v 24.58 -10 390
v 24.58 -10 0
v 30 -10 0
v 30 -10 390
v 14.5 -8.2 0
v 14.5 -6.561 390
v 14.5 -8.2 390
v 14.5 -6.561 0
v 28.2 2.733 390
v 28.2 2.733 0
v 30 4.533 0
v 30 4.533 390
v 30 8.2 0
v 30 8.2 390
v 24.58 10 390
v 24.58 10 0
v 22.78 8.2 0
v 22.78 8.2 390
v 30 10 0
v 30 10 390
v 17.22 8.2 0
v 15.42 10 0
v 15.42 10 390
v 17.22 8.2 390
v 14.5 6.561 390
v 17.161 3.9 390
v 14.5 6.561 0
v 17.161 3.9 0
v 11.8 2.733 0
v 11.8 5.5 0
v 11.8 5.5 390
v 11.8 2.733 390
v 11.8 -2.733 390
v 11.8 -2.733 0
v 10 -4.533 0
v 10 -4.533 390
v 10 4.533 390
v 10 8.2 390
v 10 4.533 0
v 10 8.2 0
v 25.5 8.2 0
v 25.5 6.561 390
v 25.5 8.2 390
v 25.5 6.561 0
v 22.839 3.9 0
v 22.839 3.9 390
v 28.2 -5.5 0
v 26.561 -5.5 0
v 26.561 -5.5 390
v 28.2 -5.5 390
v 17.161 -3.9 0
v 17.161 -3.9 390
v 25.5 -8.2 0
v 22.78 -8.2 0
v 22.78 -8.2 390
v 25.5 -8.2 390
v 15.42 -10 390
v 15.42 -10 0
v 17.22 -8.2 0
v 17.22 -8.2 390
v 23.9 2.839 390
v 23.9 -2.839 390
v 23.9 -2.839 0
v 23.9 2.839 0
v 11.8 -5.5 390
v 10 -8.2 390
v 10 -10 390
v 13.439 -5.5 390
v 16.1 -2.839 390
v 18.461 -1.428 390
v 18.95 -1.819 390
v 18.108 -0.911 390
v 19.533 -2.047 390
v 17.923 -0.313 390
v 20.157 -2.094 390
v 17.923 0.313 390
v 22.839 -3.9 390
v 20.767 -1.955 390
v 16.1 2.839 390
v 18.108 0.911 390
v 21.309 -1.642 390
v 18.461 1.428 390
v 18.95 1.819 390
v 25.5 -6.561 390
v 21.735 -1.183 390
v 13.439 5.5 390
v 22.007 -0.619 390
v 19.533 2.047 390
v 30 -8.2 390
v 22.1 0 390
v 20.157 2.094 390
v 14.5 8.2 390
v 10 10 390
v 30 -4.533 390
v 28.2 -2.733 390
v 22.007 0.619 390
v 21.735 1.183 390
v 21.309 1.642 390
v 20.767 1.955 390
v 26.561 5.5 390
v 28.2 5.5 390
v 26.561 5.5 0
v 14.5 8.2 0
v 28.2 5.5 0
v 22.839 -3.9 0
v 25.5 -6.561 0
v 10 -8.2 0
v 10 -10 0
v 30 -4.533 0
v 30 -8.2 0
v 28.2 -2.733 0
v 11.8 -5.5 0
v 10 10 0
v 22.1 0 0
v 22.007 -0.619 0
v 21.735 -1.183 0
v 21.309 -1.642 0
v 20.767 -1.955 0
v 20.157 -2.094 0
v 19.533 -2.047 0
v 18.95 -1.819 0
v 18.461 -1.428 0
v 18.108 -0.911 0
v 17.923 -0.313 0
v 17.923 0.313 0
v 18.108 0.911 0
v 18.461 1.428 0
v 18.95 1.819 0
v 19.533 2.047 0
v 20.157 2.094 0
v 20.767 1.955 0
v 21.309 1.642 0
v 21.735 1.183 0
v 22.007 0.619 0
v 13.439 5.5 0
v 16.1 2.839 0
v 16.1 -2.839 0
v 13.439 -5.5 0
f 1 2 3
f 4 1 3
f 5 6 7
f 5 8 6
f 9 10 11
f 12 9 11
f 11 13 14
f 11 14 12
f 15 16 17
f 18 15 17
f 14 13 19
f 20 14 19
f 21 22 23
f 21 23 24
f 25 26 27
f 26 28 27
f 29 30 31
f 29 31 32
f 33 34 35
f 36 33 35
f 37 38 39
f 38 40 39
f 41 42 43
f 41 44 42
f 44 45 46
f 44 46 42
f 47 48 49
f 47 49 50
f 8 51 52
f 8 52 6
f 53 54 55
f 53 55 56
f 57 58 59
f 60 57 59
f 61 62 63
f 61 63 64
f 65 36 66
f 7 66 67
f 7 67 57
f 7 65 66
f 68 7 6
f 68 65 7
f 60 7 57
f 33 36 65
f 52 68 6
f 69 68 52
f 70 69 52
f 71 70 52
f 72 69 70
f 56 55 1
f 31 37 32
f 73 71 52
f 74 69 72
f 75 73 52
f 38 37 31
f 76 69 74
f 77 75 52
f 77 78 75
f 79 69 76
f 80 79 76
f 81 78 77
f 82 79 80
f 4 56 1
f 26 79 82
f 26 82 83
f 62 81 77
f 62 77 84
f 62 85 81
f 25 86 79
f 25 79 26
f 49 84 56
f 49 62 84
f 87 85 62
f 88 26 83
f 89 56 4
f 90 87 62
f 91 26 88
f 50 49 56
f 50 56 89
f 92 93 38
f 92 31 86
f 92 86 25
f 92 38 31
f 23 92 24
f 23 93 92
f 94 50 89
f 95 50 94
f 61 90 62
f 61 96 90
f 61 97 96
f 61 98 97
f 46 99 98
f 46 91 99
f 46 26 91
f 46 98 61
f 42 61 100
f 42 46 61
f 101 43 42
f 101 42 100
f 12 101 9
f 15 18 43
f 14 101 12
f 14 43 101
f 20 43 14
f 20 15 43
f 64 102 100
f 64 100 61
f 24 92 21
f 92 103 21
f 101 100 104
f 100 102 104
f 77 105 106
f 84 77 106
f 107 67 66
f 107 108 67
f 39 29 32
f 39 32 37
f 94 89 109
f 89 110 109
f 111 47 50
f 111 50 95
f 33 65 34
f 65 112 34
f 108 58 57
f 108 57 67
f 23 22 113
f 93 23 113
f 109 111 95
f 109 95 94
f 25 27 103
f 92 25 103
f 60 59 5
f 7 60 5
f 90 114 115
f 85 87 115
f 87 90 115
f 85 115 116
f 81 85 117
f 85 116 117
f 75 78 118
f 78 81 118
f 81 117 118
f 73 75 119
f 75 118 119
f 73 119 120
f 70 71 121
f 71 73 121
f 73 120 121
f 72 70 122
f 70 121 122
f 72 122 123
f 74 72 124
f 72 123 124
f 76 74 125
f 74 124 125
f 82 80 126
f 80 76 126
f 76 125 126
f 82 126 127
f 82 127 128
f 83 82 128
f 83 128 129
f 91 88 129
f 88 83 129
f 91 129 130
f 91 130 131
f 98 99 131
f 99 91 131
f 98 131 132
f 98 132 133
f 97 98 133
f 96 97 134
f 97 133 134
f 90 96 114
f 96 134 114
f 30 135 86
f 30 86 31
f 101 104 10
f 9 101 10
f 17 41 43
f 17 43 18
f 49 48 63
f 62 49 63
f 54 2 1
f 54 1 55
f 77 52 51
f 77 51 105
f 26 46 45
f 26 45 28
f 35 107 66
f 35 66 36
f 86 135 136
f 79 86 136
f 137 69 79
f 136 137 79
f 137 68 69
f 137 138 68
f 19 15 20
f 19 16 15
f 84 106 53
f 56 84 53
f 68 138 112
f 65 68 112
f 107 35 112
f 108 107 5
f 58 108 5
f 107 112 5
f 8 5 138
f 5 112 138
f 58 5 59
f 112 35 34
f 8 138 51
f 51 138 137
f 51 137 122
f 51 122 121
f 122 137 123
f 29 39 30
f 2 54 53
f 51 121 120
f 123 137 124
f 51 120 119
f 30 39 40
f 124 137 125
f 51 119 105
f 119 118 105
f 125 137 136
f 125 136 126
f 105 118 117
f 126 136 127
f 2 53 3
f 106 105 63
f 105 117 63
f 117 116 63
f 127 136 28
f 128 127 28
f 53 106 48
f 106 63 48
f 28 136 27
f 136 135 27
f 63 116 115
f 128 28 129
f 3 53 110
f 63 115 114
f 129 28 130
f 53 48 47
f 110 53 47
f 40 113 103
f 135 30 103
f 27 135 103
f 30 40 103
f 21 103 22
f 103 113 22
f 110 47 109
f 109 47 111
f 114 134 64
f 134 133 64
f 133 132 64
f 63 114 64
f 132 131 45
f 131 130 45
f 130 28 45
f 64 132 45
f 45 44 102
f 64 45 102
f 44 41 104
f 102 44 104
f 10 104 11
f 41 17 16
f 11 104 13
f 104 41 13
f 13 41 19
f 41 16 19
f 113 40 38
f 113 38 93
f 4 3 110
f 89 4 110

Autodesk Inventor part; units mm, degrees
ref_plane "YZ Plane" through (0, 0, 0) normal (1, 0, 0) x (0, 1, 0)
ref_plane "XZ Plane" through (0, 0, 0) normal (0, 1, 0) x (-1, 0, 0)
ref_plane "XY Plane" through (0, 0, 0) normal (0, 0, 1) x (1, 0, 0)
sketch "Boceto1" plane through (0, 0, 0) normal (0, 0, 1) x (1, 0, 0)
  line L0 (30, 10) -> (30, -10) construction
  line L1 (20, -10) -> (20, 10) construction
  circle A0 centre (20, 0) radius 2.1
  line L2 (22.8393, 3.9) -> (17.1607, 3.9)
  line L3 (17.1607, -3.9) -> (22.8393, -3.9)
  line L4 (23.9, -2.8393) -> (23.9, 2.8393)
  line L5 (20, 10) -> (20, -10) construction
  line L6 (25.5, 6.5607) -> (25.5, 8.2)
  line L7 (23.9, 3.9) -> (25.9093, 5.9093) construction
  line L8 (26.5607, 5.5) -> (23.9, 2.8393)
  line L9 (22.8393, 3.9) -> (25.5, 6.5607)
  line L10 (24.58, 10) -> (22.78, 8.2)
  line L11 (27, -5.9393) -> (27, -8.2) construction
  line L12 (25.5, -6.5607) -> (25.5, -8.2)
  line L13 (26.5607, -5.5) -> (23.9, -2.8393)
  line L14 (23.9, -3.9) -> (25.9093, -5.9093) construction
  line L15 (22.8393, -3.9) -> (25.5, -6.5607)
  line L16 (24.58, -10) -> (22.78, -8.2)
  line L17 (22.78, -8.2) -> (25.5, -8.2)
  line L18 (27.1393, -8.2) -> (30, -8.2) construction
  line L19 (25.5, 8.2) -> (22.78, 8.2)
  line L20 (30, -10) -> (30, 10) construction
  line L21 (24.58, 10) -> (30, 10)
  line L22 (24.58, -10) -> (30, -10)
  line L23 (30, -10) -> (30, -8.2)
  line L24 (30, 8.2) -> (30, 10)
  line L25 (28.2, -10) -> (28.2, -5.5) construction
  line L26 (28.2, -5.5) -> (28.2, -2.7333)
  line L27 (25.5, -6.5607) -> (26.5607, -5.5) construction
  line L28 (26.5607, -5.5) -> (28.2, -5.5)
  line L29 (28.2, -2.7333) -> (30, -4.5333)
  line L30 (30, -8.2) -> (30, -4.5333)
  line L31 (26.5607, 5.5) -> (23.9, 2.8393)
  line L32 (30, 10) -> (30, 8.2)
  line L33 (28.2, 5.5) -> (28.2, 2.7333)
  line L34 (26.5607, 5.5) -> (28.2, 5.5)
  line L35 (28.2, 2.7333) -> (30, 4.5333)
  line L36 (30, 8.2) -> (30, 4.5333)
  line L37 (10, 10) -> (10, -10) construction
  line L38 (15.42, 10) -> (17.22, 8.2)
  line L39 (14.5, 8.2) -> (17.22, 8.2)
  line L40 (15.42, 10) -> (10, 10)
  line L41 (16.1, -2.8393) -> (16.1, 2.8393)
  line L42 (16.1, -3.9) -> (14.0907, -5.9093) construction
  line L43 (17.22, -8.2) -> (14.5, -8.2)
  line L44 (17.1607, 3.9) -> (22.8393, 3.9)
  circle A1 centre (20, 0) radius 2.1
  line L45 (22.8393, -3.9) -> (17.1607, -3.9)
  line L46 (15.42, -10) -> (17.22, -8.2)
  line L47 (14.5, -6.5607) -> (14.5, -8.2)
  line L48 (12.8607, -8.2) -> (10, -8.2) construction
  line L49 (15.42, -10) -> (10, -10)
  line L50 (14.5, 6.5607) -> (14.5, 8.2)
  line L51 (16.1, 3.9) -> (14.0907, 5.9093) construction
  line L52 (13.4393, 5.5) -> (16.1, 2.8393)
  line L53 (17.1607, 3.9) -> (14.5, 6.5607)
  line L54 (17.1607, -3.9) -> (14.5, -6.5607)
  line L55 (13.4393, -5.5) -> (16.1, -2.8393)
  line L56 (13, -5.9393) -> (13, -8.2) construction
  line L57 (10, -10) -> (10, 10) construction
  line L58 (10, -10) -> (10, -8.2)
  line L59 (10, 8.2) -> (10, 10)
  line L60 (11.8, -10) -> (11.8, -5.5) construction
  line L61 (11.8, -5.5) -> (11.8, -2.7333)
  line L62 (14.5, -6.5607) -> (13.4393, -5.5) construction
  line L63 (13.4393, -5.5) -> (11.8, -5.5)
  line L64 (11.8, -2.7333) -> (10, -4.5333)
  line L65 (10, -8.2) -> (10, -4.5333)
  line L66 (13.4393, 5.5) -> (16.1, 2.8393)
  line L67 (13.4393, 5.5) -> (11.8, 5.5)
  line L68 (11.8, 5.5) -> (11.8, 2.7333)
  line L69 (11.8, 2.7333) -> (10, 4.5333)
  line L70 (10, 8.2) -> (10, 4.5333)
  line L71 (10, 10) -> (10, 8.2)
  dimension "d9" = 20
  dimension "d53" = 10
  dimension "d56" = 1.6393
  dimension "d58" = 2.72
  dimension "d66" = 1.8
  dimension "d71" = 45
  dimension "d72" = 2.6607
  dimension "d77" = 4.2
  dimension "d78" = 3.9
  dimension "d79" = 3.9
  dimension "d80" = 3.9
  dimension "d81" = 1.5
  dimension "d82" = 45
  dimension "d83" = 90
  dimension "d84" = 45
  dimension "d85" = 5.42
  dimension "d86" = 1.5
  dimension "d87" = 90
  dimension "d88" = 5.42
  dimension "d89" = 5.4667
  dimension "d90" = 5.6787
  dimension "d91" = 5.6787
  dimension "d92" = 5.6787
  dimension "d93" = 2.6607
  dimension "d94" = 2.6607
  dimension "d95" = 2.6607
extrude "Extrusión1" add sketch "Boceto1" along normal blind 390
properties part number "V-SLOT_2020" material "Aluminio"
